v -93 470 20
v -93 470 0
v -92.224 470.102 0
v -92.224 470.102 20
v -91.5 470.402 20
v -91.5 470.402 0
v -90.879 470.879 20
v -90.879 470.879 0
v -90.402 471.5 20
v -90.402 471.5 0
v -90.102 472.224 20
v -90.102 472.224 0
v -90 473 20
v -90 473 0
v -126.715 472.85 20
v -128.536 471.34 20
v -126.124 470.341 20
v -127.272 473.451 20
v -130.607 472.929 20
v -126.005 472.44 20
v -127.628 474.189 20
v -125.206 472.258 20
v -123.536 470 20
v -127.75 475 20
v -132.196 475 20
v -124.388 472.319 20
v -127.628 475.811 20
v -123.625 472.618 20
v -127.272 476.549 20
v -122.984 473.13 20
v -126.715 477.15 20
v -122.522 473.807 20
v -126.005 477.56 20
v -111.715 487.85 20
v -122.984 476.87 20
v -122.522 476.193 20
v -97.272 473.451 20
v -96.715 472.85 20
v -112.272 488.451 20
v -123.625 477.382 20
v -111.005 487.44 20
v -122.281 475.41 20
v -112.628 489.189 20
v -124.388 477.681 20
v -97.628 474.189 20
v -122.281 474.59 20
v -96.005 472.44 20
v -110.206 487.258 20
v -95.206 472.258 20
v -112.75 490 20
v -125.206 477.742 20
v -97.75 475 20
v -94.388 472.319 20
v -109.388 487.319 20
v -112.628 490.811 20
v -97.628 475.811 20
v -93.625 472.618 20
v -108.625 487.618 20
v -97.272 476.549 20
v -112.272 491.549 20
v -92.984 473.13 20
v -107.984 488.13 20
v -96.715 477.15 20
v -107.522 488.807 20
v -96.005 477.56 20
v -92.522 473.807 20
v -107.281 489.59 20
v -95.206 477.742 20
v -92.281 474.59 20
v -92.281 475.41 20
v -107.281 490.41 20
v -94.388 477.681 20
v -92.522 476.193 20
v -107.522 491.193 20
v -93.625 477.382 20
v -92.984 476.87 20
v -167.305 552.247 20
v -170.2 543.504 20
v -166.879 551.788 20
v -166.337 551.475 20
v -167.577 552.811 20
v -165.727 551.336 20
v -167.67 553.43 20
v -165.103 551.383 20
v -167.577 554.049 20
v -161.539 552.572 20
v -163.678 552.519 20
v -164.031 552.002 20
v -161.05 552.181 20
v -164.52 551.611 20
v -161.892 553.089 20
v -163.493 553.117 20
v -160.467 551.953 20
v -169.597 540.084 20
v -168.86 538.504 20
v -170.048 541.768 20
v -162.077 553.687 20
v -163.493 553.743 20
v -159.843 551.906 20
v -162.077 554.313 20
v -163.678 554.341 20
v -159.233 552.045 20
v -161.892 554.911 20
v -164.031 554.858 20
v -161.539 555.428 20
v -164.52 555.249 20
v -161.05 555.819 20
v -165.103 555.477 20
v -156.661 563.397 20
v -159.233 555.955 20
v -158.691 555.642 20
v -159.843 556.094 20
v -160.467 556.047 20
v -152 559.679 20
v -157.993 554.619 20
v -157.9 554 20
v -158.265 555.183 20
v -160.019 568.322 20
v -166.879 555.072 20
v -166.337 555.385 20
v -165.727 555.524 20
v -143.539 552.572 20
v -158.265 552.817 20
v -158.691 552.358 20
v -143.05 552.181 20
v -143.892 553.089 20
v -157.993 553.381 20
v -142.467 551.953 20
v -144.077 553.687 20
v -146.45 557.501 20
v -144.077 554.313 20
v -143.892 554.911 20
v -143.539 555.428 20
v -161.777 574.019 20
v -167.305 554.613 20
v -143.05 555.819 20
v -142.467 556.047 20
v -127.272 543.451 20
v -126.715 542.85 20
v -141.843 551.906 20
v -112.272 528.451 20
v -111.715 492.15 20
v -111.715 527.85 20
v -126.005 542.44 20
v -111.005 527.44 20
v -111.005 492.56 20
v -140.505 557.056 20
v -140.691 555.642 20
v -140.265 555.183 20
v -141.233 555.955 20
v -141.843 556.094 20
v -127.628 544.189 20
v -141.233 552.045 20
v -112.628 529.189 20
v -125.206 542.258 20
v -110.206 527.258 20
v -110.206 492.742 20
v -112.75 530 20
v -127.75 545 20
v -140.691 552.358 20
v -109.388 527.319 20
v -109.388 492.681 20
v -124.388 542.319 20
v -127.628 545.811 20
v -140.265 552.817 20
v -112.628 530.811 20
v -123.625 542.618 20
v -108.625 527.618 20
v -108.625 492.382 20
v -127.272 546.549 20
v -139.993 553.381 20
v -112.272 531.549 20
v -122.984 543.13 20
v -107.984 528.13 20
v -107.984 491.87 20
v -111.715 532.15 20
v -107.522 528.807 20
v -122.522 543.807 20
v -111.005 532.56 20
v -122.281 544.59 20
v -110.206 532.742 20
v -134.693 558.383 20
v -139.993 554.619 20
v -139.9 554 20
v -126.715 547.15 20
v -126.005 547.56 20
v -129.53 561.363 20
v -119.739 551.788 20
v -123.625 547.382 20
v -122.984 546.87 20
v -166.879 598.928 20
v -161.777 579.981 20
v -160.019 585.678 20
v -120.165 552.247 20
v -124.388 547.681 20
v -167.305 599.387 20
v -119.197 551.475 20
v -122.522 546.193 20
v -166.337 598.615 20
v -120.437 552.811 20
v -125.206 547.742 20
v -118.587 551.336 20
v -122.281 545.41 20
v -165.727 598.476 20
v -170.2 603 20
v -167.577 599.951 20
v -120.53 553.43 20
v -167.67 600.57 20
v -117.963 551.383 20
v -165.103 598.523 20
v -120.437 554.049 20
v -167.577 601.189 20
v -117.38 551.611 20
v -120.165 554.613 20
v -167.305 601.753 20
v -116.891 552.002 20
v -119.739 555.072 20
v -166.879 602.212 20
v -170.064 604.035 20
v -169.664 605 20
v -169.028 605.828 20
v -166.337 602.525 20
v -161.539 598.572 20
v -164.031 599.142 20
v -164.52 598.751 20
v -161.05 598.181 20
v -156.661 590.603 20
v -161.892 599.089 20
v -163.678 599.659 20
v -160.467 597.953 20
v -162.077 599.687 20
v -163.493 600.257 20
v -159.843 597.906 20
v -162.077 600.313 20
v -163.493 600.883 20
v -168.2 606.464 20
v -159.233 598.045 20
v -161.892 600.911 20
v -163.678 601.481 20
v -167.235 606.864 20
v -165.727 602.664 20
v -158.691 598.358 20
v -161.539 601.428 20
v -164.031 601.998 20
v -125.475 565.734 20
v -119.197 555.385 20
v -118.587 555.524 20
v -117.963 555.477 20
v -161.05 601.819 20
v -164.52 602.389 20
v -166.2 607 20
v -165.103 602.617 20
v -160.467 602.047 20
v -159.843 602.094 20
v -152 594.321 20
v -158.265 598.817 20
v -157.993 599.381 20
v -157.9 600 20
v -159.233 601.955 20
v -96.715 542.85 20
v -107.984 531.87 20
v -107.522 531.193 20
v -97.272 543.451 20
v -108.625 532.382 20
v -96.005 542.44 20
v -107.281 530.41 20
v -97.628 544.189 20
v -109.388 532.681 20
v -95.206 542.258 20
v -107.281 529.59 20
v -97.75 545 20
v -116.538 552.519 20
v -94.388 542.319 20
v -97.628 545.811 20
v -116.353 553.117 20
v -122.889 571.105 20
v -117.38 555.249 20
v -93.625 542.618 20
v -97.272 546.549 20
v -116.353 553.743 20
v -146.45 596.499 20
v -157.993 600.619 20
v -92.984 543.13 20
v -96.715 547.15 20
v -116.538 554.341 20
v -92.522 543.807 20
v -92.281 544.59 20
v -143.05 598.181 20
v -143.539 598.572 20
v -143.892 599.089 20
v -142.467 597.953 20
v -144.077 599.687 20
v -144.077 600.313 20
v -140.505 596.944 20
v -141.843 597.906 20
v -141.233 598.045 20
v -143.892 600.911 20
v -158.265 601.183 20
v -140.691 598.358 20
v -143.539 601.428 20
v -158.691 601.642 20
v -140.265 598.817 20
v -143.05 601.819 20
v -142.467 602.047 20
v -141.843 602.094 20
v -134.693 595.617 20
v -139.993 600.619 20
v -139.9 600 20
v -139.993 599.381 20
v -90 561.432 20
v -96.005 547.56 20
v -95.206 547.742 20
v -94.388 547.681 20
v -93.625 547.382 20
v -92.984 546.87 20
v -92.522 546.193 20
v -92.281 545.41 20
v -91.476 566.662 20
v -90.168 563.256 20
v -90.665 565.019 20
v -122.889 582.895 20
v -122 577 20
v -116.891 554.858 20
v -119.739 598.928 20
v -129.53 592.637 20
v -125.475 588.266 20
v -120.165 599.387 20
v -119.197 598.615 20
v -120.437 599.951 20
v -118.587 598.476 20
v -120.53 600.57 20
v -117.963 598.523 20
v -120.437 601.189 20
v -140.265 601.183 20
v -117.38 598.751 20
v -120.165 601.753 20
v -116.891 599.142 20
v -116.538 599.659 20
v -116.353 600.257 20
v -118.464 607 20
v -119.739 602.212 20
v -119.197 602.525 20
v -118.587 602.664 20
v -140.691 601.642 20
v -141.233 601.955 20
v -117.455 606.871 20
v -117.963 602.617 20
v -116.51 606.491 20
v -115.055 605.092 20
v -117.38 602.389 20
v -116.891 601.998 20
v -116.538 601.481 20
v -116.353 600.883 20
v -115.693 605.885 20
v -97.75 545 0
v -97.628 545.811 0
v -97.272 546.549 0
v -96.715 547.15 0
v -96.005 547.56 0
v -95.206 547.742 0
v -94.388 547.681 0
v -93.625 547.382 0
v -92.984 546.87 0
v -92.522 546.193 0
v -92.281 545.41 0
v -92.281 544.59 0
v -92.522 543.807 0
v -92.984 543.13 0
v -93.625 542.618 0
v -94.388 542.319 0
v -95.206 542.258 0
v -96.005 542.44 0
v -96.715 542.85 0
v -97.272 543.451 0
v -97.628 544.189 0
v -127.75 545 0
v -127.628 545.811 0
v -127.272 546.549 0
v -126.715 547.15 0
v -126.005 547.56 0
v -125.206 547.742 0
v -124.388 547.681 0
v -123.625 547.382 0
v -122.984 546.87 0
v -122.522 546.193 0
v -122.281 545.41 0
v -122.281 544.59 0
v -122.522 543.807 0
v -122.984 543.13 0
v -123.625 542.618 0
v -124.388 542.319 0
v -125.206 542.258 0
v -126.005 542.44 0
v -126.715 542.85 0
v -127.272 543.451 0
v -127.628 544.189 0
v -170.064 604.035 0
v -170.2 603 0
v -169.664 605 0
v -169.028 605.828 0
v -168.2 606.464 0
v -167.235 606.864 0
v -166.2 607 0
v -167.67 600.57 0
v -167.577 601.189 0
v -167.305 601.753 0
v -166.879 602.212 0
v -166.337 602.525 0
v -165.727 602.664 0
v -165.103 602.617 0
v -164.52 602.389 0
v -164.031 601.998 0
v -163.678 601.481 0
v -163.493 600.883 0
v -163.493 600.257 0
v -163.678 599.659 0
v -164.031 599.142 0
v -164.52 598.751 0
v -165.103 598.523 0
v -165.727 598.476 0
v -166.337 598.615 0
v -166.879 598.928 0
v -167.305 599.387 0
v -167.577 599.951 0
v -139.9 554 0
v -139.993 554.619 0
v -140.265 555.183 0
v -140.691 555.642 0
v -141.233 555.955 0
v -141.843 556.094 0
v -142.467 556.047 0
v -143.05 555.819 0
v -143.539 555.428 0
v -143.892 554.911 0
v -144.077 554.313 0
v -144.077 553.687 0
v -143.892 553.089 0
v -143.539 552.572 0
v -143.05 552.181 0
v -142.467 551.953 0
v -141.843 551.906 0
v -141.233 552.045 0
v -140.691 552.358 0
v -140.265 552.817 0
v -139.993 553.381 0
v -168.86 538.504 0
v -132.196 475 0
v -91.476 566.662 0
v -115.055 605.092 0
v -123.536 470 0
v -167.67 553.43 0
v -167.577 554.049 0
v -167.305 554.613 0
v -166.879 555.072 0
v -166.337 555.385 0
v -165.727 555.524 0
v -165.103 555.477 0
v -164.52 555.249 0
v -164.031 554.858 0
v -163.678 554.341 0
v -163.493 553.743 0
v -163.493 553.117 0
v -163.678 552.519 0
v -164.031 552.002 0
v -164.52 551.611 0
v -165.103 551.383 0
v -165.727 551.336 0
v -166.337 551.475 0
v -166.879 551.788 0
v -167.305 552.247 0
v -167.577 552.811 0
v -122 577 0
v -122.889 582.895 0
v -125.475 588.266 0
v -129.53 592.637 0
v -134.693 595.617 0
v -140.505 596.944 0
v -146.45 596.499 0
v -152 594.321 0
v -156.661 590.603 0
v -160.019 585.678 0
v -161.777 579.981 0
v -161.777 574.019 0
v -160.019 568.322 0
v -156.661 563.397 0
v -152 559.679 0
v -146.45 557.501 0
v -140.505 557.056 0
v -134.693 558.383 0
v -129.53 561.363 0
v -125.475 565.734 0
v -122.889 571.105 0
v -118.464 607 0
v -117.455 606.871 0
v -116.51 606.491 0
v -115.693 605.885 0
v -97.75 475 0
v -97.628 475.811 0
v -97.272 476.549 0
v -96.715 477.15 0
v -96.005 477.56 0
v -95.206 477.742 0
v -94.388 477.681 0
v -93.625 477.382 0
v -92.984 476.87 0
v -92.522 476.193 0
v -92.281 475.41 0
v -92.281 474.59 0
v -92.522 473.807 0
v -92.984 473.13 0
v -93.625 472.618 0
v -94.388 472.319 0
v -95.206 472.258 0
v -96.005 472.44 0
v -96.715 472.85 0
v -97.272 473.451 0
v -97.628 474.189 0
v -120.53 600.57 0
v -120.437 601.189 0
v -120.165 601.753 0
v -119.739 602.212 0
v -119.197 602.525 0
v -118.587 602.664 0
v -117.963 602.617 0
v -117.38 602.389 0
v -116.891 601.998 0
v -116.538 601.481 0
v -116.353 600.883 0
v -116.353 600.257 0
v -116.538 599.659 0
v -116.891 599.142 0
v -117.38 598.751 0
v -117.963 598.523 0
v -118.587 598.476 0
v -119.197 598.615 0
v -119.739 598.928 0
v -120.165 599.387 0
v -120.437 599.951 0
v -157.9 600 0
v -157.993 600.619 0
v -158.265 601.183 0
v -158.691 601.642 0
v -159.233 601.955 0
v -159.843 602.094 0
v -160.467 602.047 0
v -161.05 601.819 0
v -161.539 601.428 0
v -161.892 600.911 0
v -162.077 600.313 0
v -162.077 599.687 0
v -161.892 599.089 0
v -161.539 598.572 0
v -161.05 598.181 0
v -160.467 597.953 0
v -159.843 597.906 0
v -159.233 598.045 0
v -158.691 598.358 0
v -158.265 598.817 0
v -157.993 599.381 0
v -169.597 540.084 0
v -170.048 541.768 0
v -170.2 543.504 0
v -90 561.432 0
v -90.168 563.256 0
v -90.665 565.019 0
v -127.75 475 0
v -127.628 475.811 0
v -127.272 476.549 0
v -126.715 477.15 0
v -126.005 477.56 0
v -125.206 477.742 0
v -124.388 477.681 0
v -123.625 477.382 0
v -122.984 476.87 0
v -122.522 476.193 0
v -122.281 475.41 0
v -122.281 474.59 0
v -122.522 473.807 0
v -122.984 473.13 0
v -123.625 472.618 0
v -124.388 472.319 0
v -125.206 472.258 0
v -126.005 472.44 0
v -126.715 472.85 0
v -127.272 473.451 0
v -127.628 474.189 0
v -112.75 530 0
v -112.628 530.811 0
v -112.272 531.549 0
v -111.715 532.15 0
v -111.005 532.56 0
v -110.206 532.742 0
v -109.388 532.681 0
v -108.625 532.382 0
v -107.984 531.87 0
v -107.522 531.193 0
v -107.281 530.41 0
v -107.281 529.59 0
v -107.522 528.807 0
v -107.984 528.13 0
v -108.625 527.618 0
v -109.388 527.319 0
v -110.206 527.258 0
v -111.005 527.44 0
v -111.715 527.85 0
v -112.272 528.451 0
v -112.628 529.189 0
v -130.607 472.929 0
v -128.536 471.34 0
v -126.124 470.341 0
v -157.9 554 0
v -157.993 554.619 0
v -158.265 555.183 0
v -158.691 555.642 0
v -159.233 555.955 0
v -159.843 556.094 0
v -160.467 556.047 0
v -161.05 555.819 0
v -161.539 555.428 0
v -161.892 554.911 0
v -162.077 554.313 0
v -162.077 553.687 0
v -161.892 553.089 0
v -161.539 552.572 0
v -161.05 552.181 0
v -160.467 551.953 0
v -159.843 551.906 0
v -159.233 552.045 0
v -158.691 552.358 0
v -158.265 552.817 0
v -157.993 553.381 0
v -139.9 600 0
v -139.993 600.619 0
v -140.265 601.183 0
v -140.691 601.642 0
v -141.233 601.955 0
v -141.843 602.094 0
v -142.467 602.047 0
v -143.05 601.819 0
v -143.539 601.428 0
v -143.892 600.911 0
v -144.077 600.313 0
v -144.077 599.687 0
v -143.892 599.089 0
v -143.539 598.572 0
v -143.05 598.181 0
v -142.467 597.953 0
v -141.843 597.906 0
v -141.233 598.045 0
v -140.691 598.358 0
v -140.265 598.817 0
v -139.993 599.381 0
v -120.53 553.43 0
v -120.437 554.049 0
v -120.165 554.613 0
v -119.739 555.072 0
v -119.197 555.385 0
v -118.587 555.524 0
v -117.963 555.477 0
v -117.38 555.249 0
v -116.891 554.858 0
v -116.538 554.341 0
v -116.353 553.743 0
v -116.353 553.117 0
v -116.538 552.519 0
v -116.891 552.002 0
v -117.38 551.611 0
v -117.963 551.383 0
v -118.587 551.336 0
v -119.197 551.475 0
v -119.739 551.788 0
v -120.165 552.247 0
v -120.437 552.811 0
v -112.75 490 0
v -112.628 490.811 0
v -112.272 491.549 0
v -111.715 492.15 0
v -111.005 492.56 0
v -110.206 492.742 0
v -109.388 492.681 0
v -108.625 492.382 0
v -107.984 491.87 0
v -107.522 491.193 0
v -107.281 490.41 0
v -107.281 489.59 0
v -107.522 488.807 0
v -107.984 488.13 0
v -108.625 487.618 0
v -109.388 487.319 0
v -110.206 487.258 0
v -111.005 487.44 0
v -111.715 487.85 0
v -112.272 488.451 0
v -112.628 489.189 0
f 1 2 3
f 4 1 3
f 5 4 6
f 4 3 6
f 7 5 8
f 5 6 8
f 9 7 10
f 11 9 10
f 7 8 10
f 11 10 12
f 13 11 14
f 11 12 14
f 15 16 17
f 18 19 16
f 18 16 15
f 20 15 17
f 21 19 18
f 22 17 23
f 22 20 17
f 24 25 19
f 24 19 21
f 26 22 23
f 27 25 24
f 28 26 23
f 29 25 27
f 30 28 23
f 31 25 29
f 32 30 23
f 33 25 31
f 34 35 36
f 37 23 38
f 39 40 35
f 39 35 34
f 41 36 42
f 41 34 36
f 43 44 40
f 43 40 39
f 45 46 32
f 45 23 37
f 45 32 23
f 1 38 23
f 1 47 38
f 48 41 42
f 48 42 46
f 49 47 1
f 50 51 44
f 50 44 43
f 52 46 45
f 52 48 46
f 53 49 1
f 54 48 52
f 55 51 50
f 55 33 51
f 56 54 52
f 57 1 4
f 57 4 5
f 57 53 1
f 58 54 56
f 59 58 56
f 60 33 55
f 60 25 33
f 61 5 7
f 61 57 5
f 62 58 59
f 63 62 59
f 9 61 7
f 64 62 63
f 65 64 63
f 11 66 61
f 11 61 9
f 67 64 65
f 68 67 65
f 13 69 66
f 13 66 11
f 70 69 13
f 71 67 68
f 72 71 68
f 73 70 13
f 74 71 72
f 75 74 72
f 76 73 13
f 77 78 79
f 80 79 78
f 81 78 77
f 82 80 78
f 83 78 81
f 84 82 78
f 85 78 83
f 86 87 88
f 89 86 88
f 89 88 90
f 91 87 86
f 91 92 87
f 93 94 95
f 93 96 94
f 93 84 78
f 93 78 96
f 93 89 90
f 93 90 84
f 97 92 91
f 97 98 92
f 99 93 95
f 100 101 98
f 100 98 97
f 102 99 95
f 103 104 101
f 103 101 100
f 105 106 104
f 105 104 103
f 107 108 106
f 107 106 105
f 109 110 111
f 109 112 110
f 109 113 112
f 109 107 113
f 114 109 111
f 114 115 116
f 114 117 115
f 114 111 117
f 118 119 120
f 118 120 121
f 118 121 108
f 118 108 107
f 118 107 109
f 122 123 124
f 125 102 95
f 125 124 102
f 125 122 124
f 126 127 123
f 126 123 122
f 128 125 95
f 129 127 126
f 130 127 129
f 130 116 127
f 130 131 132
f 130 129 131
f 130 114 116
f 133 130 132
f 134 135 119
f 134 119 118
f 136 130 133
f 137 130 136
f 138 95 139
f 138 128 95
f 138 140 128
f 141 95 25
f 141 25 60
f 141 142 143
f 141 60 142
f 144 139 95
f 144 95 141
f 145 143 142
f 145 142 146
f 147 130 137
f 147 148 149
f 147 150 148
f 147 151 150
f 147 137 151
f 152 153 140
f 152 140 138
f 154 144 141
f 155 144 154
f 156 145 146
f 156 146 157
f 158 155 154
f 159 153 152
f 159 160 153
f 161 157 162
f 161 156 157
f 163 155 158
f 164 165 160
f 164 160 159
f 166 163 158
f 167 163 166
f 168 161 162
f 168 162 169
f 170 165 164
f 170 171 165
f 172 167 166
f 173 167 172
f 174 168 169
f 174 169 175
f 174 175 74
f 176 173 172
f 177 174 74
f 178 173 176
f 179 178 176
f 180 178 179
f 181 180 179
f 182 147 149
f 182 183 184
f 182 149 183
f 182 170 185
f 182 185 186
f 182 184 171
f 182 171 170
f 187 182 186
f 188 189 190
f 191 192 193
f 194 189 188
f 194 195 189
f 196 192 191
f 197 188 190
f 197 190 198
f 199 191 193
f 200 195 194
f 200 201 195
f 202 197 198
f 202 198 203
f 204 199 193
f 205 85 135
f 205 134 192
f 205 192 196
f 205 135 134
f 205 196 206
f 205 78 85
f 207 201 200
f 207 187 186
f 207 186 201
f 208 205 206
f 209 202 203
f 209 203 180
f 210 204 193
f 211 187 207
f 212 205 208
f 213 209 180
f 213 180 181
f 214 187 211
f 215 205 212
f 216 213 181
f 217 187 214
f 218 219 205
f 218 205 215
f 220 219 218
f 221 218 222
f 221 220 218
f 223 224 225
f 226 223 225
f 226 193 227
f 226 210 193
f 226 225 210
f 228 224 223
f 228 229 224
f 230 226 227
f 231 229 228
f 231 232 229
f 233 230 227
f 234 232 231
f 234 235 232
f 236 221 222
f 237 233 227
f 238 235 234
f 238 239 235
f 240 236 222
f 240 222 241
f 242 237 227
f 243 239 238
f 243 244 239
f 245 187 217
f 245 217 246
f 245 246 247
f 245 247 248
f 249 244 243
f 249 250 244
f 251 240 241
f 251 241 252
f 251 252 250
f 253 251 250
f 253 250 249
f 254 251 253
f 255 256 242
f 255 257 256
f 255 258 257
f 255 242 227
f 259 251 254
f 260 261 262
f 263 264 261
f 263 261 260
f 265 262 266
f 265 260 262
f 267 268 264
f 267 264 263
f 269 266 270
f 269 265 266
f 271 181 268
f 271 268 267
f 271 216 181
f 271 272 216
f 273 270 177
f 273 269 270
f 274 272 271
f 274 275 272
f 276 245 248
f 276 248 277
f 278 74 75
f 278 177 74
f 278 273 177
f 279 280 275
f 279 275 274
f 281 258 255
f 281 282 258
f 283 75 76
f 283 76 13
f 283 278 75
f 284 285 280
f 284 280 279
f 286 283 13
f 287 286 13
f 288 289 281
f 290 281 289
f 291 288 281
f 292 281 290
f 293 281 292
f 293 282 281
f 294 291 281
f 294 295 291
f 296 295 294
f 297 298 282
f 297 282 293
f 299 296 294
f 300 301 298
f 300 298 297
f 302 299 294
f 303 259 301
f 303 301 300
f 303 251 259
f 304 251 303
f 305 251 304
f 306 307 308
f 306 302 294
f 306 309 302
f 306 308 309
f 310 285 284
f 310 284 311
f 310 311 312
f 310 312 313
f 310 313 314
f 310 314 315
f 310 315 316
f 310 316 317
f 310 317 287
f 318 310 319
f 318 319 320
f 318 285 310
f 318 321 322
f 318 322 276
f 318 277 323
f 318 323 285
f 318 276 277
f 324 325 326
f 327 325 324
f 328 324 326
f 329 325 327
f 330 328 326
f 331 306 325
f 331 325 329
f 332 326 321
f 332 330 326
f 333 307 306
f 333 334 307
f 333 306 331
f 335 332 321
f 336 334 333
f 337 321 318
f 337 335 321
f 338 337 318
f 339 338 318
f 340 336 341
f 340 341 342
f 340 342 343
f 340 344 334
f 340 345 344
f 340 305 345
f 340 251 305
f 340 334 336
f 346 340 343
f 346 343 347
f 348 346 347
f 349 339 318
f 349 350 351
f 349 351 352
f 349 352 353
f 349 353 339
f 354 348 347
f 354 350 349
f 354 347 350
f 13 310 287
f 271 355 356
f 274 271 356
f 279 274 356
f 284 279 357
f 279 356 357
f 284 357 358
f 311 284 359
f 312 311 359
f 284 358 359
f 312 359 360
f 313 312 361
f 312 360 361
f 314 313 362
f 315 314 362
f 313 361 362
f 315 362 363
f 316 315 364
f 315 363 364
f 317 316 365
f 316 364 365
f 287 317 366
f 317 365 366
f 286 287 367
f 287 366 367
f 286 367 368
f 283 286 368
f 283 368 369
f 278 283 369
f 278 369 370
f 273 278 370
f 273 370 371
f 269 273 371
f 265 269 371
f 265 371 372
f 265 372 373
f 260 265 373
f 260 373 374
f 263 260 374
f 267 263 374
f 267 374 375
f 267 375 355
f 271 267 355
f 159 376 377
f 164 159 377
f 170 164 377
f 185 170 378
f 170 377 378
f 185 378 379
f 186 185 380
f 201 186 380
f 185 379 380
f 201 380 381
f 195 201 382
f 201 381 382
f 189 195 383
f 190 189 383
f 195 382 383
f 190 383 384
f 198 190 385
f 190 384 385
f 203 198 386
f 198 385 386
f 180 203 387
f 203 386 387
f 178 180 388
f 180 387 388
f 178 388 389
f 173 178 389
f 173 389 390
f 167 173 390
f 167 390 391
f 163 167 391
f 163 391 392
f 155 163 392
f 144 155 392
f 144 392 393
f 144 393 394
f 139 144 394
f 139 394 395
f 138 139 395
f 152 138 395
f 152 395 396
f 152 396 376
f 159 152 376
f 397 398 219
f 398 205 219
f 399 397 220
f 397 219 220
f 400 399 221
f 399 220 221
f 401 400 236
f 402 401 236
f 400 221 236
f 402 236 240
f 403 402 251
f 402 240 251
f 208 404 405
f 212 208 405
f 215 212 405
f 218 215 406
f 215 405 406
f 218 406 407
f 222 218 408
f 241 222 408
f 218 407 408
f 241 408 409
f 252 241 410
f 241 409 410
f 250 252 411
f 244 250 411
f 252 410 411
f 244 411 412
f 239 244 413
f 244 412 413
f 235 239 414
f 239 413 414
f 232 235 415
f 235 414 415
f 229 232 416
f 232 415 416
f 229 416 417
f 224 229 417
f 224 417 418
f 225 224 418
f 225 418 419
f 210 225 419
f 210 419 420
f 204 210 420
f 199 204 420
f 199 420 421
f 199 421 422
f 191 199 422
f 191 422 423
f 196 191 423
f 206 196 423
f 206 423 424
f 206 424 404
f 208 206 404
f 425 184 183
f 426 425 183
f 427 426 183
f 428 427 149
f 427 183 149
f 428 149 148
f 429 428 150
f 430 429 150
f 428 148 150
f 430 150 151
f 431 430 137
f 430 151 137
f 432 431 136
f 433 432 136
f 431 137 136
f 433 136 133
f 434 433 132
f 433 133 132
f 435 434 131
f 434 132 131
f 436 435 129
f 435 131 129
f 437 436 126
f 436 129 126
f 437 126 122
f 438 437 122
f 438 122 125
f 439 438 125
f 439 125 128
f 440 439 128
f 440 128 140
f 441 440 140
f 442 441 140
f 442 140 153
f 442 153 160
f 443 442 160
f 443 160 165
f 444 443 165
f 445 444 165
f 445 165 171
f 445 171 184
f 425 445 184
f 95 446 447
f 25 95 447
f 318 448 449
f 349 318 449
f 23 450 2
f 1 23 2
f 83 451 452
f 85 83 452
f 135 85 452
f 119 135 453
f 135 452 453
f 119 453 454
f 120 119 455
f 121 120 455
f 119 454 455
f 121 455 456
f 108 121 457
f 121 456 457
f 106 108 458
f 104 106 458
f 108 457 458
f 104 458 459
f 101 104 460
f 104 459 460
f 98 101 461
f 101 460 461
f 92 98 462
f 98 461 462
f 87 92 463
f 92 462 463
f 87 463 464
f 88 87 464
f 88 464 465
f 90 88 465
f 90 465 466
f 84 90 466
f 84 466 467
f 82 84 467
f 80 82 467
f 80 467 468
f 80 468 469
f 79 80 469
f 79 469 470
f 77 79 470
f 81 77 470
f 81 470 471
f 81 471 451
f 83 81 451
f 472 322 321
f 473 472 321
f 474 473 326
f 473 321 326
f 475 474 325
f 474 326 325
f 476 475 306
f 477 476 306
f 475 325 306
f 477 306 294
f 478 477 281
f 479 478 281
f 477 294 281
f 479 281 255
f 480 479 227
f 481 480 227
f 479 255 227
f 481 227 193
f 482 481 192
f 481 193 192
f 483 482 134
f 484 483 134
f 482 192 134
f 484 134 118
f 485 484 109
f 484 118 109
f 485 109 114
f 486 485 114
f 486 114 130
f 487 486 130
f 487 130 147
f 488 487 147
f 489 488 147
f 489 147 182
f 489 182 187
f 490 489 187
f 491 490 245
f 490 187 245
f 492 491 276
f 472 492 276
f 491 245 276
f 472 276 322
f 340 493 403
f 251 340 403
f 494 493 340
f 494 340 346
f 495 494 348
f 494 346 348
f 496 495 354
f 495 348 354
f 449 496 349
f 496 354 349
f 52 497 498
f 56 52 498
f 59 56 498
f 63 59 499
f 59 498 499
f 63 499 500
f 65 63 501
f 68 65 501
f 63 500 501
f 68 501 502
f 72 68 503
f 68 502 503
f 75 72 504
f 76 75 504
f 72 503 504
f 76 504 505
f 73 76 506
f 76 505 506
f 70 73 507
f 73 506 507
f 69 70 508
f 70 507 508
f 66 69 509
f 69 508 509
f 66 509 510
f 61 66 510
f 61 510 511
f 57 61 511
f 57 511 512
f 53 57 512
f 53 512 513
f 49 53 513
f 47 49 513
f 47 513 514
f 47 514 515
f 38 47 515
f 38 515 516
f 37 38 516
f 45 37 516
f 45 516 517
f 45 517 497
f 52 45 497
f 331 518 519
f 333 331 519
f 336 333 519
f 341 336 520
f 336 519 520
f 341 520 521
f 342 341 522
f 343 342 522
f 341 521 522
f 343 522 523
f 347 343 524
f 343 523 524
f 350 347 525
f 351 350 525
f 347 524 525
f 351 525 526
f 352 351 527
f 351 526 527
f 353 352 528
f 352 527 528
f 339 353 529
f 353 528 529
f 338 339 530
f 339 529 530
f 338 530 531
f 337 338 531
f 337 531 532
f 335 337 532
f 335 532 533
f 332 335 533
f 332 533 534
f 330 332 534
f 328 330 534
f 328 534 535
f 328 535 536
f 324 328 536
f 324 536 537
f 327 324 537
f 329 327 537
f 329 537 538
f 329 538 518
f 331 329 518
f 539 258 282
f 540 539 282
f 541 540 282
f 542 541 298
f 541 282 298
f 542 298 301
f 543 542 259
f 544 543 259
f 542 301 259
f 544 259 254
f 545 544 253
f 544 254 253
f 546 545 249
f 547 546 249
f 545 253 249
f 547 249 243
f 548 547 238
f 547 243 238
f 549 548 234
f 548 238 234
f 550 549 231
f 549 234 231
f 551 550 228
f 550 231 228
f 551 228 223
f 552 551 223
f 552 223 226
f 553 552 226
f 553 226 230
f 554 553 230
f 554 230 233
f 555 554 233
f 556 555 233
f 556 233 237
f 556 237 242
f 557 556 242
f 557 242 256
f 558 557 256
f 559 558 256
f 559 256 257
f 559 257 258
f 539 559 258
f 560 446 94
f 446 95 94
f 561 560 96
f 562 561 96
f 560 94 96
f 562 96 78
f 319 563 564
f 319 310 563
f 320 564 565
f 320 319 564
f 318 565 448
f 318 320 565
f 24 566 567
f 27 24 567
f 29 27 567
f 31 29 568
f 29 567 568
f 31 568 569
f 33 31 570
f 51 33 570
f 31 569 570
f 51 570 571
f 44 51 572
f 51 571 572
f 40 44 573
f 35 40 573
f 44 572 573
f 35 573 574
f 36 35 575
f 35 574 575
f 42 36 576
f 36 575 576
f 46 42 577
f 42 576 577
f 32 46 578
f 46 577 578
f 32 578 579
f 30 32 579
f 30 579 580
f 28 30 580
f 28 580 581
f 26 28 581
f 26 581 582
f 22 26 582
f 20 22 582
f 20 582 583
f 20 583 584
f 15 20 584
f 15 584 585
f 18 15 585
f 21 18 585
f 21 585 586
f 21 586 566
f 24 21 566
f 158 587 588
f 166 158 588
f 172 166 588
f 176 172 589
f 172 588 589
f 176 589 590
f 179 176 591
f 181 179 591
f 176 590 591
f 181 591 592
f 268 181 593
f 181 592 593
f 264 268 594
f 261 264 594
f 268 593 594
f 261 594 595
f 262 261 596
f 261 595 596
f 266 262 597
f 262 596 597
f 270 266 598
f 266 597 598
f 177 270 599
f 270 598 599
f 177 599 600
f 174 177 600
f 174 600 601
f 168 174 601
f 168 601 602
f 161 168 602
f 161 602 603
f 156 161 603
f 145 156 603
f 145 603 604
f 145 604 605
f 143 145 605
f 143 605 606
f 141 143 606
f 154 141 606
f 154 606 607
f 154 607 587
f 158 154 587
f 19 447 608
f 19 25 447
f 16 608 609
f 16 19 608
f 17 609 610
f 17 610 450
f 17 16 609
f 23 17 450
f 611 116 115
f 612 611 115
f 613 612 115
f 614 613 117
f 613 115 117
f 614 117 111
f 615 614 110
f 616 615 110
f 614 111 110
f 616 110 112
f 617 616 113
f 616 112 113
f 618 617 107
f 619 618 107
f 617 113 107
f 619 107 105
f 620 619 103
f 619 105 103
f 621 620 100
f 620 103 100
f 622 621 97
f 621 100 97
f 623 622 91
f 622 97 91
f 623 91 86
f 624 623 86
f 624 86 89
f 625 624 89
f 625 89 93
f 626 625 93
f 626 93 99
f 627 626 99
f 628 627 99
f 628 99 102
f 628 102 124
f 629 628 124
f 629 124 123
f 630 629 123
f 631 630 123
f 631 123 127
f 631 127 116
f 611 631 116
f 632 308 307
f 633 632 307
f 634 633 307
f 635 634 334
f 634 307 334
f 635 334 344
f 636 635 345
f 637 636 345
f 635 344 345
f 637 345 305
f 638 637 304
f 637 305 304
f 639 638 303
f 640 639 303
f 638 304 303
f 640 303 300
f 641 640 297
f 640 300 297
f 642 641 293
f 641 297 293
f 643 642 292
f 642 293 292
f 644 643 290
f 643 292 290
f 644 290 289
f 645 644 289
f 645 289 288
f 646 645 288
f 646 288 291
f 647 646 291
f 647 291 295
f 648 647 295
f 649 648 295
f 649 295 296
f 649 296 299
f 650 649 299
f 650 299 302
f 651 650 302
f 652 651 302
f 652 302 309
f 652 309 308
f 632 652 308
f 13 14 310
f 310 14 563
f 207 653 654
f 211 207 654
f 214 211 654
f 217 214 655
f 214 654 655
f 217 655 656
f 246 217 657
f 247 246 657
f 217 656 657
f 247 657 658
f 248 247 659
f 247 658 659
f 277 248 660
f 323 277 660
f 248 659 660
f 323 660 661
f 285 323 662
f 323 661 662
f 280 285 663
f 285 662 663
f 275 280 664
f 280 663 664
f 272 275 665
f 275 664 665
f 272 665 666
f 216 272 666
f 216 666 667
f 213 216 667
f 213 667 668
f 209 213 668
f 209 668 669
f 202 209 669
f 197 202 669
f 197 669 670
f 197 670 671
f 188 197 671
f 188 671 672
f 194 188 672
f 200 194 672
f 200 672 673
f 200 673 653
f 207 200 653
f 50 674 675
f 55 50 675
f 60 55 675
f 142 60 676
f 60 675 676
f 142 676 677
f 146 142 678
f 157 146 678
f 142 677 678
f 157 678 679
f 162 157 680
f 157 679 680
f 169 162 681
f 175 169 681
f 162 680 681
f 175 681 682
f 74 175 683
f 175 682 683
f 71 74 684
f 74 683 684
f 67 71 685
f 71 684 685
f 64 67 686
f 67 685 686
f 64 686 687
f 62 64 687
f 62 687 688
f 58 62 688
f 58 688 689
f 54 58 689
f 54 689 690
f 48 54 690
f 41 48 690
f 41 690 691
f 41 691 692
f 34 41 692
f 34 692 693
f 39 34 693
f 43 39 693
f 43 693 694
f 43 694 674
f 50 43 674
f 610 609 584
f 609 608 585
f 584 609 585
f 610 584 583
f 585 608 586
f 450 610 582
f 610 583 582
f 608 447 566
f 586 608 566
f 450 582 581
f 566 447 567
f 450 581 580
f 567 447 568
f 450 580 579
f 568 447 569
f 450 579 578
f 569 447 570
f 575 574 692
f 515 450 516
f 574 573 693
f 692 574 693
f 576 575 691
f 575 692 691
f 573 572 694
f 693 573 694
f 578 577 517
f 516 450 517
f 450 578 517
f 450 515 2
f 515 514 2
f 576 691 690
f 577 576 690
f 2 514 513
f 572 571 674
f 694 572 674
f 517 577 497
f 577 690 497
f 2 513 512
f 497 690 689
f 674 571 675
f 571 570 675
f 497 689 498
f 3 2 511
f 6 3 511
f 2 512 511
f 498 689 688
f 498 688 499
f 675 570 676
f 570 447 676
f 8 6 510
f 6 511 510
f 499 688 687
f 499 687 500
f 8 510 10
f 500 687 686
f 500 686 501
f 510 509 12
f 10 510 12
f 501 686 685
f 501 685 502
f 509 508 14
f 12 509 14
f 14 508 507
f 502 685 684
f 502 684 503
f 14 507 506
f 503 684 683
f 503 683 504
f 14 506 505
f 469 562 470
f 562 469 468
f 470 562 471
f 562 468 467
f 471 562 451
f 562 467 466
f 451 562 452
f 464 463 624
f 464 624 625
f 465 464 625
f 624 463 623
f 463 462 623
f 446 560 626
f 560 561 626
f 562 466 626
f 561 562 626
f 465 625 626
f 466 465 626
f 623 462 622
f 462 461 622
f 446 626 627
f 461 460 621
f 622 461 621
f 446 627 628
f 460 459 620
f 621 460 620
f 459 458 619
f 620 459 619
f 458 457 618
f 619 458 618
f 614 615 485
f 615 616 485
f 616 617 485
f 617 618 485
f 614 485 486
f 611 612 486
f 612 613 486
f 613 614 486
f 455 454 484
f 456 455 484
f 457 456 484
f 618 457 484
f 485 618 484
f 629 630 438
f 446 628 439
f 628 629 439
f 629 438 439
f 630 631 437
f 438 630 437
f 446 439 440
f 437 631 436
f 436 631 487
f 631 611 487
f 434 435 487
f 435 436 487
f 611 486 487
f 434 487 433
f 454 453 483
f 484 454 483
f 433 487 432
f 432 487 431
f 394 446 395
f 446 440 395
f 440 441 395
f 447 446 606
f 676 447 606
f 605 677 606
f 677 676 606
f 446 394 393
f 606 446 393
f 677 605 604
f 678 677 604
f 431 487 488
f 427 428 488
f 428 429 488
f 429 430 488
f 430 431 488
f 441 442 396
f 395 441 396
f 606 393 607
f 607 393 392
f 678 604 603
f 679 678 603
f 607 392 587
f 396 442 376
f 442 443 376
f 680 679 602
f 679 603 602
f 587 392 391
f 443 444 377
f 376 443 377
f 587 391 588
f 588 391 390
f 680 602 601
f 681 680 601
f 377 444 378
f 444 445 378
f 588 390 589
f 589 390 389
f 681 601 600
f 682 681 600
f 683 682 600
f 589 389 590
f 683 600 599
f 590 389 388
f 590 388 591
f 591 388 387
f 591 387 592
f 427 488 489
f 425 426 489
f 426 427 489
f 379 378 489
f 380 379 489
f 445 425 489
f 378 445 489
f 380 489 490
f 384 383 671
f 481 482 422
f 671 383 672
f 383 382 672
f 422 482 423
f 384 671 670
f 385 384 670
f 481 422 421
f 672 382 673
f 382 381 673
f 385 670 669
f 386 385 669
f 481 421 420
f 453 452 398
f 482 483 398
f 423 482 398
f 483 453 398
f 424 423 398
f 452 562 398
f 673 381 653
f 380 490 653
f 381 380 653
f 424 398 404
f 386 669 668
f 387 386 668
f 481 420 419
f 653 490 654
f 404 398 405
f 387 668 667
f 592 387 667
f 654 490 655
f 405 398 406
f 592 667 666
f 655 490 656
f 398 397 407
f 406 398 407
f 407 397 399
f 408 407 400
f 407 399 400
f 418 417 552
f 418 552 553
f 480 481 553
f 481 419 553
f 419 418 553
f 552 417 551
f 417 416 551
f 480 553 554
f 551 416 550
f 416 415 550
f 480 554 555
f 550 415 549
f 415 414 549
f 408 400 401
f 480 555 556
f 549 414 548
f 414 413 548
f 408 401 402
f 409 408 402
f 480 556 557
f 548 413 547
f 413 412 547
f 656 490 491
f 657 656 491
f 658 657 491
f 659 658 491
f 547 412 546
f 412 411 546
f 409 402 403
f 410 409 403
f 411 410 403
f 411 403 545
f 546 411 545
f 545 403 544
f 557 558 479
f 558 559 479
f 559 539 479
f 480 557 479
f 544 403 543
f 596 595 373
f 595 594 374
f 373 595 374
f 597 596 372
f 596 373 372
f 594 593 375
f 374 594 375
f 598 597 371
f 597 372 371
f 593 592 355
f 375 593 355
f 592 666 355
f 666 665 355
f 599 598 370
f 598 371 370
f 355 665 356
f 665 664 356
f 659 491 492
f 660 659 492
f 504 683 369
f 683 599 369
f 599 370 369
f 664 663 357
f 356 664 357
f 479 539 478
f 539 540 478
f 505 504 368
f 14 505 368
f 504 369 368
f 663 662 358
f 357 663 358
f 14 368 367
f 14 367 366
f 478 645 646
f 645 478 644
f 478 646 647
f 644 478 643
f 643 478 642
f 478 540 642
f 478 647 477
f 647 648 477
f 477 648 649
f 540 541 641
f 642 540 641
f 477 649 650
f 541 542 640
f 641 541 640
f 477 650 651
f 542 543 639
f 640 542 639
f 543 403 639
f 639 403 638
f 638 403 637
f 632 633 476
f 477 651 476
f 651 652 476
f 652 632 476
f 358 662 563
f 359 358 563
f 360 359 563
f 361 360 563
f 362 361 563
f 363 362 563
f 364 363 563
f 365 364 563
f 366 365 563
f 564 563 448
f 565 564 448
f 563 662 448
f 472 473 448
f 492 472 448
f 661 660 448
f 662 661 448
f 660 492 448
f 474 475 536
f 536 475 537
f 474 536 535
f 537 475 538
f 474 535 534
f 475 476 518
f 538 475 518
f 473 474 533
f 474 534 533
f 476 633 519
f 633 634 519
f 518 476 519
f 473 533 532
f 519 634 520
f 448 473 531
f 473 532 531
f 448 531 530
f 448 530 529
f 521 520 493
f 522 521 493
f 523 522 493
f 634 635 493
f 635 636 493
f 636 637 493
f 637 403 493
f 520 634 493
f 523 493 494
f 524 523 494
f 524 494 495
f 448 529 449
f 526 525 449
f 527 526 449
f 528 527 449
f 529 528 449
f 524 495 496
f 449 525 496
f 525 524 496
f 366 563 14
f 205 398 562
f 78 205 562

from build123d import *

# Parameters (mm, degrees)
BOSS_EXTRUDE1_DEPTH     = 20
FILLET1_R               = 10
SKETCH2_R               = 20
CUT_EXTRUDE1_DEPTH      = 20
TAP_DRILL_FOR_M5_TAP1_D = 4.2
M5_CLEARANCE_HOLE1_D    = 5.5
TAP_DRILL_FOR_M5_TAP2_D = 4.2
FILLET2_R               = 4


with BuildPart() as part:
    # Sketch1 → Boss-Extrude1 (new body)
    with BuildSketch(Plane.XY):
        with BuildLine():
            Line((-170.200000001, 540.824594888), (-129.309401077, 470))
            Line((-129.309401077, 470), (-93, 470))
            ThreePointArc((-93, 470), (-90.878679656, 470.878679656), (-90, 473))
            Line((-90, 473), (-90, 564.25527297))
            Line((-90, 564.25527297), (-116.225329238, 607))
            Line((-116.225329238, 607), (-170.200000001, 607))
            Line((-170.200000001, 607), (-170.200000001, 540.824594888))
        make_face()
    extrude(amount=BOSS_EXTRUDE1_DEPTH)

    # Fillet1
    fillet1_edges = [part.edges().sort_by_distance(p)[0] for p in [
        (-90, 564.25527297, 10),
        (-129.309401077, 470, 10),
        (-170.200000001, 540.824594888, 10),
    ]]
    fillet(fillet1_edges, radius=FILLET1_R)

    # Sketch2 → Cut-Extrude1 (cut)
    with BuildSketch(Plane.XY.offset(20)):
        with Locations((-142.000000001, 577)):
            Circle(SKETCH2_R)
    extrude(amount=-CUT_EXTRUDE1_DEPTH, mode=Mode.SUBTRACT)

    # Tap Drill for M5 Tap1 (through all)
    with Locations(Plane(origin=(0, 0, 0), x_dir=(-1, 0, 0), z_dir=(0, 0, -1))):
        with Locations((160.000000001, 600), (142.000000001, 600), (142.000000001, 554), (160.000000001, 554)):
            Hole(TAP_DRILL_FOR_M5_TAP1_D / 2)

    # M5 Clearance Hole1 (through all)
    with Locations(Plane.XY.offset(20)):
        with Locations((-95, 545), (-125, 545), (-125, 475), (-95, 475), (-110, 490), (-110, 530)):
            Hole(M5_CLEARANCE_HOLE1_D / 2)

    # Tap Drill for M5 Tap2 (through all)
    with Locations(Plane.XY.offset(20)):
        with Locations((-165.570000001, 553.43), (-165.570000001, 600.57), (-118.430000001, 553.43), (-118.430000001, 600.57)):
            Hole(TAP_DRILL_FOR_M5_TAP2_D / 2)

    # Fillet2
    fillet2_edges = [part.edges().sort_by_distance(p)[0] for p in [
        (-116.225329238, 607, 10),
        (-170.200000001, 607, 10),
    ]]
    fillet(fillet2_edges, radius=FILLET2_R)


solid = part.part
